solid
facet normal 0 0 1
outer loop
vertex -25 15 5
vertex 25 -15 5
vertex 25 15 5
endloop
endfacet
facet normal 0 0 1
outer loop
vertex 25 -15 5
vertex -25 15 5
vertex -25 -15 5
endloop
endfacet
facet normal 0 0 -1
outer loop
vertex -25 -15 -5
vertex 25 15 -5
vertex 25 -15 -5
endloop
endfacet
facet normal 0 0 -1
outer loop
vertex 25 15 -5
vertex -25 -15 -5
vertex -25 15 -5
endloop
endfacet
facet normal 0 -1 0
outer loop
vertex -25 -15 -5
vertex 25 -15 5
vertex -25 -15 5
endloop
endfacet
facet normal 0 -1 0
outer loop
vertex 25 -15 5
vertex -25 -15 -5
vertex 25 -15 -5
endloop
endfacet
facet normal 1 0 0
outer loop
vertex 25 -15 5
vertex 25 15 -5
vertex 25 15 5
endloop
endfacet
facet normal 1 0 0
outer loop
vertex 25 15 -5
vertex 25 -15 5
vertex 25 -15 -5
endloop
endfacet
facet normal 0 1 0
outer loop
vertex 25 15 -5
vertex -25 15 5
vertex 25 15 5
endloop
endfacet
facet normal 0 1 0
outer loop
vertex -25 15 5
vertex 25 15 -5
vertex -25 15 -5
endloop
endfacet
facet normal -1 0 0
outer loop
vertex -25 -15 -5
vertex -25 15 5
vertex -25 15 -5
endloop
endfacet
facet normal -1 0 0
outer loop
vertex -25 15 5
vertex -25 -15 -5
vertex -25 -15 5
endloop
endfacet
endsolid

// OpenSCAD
// Parameters
body_length = 50; //[25:100:1]
body_width = 30; //[15:60:1]
body_height = 10; //[5:20:1]

// Main Body Module
module main_body() {
  color("Silver") // Use a neutral color for the main body
  translate([0, 0, 0]) // Centered at origin
    cube([body_length, body_width, body_height], center=true);
}

// Final Model
union() {
  main_body();
}
